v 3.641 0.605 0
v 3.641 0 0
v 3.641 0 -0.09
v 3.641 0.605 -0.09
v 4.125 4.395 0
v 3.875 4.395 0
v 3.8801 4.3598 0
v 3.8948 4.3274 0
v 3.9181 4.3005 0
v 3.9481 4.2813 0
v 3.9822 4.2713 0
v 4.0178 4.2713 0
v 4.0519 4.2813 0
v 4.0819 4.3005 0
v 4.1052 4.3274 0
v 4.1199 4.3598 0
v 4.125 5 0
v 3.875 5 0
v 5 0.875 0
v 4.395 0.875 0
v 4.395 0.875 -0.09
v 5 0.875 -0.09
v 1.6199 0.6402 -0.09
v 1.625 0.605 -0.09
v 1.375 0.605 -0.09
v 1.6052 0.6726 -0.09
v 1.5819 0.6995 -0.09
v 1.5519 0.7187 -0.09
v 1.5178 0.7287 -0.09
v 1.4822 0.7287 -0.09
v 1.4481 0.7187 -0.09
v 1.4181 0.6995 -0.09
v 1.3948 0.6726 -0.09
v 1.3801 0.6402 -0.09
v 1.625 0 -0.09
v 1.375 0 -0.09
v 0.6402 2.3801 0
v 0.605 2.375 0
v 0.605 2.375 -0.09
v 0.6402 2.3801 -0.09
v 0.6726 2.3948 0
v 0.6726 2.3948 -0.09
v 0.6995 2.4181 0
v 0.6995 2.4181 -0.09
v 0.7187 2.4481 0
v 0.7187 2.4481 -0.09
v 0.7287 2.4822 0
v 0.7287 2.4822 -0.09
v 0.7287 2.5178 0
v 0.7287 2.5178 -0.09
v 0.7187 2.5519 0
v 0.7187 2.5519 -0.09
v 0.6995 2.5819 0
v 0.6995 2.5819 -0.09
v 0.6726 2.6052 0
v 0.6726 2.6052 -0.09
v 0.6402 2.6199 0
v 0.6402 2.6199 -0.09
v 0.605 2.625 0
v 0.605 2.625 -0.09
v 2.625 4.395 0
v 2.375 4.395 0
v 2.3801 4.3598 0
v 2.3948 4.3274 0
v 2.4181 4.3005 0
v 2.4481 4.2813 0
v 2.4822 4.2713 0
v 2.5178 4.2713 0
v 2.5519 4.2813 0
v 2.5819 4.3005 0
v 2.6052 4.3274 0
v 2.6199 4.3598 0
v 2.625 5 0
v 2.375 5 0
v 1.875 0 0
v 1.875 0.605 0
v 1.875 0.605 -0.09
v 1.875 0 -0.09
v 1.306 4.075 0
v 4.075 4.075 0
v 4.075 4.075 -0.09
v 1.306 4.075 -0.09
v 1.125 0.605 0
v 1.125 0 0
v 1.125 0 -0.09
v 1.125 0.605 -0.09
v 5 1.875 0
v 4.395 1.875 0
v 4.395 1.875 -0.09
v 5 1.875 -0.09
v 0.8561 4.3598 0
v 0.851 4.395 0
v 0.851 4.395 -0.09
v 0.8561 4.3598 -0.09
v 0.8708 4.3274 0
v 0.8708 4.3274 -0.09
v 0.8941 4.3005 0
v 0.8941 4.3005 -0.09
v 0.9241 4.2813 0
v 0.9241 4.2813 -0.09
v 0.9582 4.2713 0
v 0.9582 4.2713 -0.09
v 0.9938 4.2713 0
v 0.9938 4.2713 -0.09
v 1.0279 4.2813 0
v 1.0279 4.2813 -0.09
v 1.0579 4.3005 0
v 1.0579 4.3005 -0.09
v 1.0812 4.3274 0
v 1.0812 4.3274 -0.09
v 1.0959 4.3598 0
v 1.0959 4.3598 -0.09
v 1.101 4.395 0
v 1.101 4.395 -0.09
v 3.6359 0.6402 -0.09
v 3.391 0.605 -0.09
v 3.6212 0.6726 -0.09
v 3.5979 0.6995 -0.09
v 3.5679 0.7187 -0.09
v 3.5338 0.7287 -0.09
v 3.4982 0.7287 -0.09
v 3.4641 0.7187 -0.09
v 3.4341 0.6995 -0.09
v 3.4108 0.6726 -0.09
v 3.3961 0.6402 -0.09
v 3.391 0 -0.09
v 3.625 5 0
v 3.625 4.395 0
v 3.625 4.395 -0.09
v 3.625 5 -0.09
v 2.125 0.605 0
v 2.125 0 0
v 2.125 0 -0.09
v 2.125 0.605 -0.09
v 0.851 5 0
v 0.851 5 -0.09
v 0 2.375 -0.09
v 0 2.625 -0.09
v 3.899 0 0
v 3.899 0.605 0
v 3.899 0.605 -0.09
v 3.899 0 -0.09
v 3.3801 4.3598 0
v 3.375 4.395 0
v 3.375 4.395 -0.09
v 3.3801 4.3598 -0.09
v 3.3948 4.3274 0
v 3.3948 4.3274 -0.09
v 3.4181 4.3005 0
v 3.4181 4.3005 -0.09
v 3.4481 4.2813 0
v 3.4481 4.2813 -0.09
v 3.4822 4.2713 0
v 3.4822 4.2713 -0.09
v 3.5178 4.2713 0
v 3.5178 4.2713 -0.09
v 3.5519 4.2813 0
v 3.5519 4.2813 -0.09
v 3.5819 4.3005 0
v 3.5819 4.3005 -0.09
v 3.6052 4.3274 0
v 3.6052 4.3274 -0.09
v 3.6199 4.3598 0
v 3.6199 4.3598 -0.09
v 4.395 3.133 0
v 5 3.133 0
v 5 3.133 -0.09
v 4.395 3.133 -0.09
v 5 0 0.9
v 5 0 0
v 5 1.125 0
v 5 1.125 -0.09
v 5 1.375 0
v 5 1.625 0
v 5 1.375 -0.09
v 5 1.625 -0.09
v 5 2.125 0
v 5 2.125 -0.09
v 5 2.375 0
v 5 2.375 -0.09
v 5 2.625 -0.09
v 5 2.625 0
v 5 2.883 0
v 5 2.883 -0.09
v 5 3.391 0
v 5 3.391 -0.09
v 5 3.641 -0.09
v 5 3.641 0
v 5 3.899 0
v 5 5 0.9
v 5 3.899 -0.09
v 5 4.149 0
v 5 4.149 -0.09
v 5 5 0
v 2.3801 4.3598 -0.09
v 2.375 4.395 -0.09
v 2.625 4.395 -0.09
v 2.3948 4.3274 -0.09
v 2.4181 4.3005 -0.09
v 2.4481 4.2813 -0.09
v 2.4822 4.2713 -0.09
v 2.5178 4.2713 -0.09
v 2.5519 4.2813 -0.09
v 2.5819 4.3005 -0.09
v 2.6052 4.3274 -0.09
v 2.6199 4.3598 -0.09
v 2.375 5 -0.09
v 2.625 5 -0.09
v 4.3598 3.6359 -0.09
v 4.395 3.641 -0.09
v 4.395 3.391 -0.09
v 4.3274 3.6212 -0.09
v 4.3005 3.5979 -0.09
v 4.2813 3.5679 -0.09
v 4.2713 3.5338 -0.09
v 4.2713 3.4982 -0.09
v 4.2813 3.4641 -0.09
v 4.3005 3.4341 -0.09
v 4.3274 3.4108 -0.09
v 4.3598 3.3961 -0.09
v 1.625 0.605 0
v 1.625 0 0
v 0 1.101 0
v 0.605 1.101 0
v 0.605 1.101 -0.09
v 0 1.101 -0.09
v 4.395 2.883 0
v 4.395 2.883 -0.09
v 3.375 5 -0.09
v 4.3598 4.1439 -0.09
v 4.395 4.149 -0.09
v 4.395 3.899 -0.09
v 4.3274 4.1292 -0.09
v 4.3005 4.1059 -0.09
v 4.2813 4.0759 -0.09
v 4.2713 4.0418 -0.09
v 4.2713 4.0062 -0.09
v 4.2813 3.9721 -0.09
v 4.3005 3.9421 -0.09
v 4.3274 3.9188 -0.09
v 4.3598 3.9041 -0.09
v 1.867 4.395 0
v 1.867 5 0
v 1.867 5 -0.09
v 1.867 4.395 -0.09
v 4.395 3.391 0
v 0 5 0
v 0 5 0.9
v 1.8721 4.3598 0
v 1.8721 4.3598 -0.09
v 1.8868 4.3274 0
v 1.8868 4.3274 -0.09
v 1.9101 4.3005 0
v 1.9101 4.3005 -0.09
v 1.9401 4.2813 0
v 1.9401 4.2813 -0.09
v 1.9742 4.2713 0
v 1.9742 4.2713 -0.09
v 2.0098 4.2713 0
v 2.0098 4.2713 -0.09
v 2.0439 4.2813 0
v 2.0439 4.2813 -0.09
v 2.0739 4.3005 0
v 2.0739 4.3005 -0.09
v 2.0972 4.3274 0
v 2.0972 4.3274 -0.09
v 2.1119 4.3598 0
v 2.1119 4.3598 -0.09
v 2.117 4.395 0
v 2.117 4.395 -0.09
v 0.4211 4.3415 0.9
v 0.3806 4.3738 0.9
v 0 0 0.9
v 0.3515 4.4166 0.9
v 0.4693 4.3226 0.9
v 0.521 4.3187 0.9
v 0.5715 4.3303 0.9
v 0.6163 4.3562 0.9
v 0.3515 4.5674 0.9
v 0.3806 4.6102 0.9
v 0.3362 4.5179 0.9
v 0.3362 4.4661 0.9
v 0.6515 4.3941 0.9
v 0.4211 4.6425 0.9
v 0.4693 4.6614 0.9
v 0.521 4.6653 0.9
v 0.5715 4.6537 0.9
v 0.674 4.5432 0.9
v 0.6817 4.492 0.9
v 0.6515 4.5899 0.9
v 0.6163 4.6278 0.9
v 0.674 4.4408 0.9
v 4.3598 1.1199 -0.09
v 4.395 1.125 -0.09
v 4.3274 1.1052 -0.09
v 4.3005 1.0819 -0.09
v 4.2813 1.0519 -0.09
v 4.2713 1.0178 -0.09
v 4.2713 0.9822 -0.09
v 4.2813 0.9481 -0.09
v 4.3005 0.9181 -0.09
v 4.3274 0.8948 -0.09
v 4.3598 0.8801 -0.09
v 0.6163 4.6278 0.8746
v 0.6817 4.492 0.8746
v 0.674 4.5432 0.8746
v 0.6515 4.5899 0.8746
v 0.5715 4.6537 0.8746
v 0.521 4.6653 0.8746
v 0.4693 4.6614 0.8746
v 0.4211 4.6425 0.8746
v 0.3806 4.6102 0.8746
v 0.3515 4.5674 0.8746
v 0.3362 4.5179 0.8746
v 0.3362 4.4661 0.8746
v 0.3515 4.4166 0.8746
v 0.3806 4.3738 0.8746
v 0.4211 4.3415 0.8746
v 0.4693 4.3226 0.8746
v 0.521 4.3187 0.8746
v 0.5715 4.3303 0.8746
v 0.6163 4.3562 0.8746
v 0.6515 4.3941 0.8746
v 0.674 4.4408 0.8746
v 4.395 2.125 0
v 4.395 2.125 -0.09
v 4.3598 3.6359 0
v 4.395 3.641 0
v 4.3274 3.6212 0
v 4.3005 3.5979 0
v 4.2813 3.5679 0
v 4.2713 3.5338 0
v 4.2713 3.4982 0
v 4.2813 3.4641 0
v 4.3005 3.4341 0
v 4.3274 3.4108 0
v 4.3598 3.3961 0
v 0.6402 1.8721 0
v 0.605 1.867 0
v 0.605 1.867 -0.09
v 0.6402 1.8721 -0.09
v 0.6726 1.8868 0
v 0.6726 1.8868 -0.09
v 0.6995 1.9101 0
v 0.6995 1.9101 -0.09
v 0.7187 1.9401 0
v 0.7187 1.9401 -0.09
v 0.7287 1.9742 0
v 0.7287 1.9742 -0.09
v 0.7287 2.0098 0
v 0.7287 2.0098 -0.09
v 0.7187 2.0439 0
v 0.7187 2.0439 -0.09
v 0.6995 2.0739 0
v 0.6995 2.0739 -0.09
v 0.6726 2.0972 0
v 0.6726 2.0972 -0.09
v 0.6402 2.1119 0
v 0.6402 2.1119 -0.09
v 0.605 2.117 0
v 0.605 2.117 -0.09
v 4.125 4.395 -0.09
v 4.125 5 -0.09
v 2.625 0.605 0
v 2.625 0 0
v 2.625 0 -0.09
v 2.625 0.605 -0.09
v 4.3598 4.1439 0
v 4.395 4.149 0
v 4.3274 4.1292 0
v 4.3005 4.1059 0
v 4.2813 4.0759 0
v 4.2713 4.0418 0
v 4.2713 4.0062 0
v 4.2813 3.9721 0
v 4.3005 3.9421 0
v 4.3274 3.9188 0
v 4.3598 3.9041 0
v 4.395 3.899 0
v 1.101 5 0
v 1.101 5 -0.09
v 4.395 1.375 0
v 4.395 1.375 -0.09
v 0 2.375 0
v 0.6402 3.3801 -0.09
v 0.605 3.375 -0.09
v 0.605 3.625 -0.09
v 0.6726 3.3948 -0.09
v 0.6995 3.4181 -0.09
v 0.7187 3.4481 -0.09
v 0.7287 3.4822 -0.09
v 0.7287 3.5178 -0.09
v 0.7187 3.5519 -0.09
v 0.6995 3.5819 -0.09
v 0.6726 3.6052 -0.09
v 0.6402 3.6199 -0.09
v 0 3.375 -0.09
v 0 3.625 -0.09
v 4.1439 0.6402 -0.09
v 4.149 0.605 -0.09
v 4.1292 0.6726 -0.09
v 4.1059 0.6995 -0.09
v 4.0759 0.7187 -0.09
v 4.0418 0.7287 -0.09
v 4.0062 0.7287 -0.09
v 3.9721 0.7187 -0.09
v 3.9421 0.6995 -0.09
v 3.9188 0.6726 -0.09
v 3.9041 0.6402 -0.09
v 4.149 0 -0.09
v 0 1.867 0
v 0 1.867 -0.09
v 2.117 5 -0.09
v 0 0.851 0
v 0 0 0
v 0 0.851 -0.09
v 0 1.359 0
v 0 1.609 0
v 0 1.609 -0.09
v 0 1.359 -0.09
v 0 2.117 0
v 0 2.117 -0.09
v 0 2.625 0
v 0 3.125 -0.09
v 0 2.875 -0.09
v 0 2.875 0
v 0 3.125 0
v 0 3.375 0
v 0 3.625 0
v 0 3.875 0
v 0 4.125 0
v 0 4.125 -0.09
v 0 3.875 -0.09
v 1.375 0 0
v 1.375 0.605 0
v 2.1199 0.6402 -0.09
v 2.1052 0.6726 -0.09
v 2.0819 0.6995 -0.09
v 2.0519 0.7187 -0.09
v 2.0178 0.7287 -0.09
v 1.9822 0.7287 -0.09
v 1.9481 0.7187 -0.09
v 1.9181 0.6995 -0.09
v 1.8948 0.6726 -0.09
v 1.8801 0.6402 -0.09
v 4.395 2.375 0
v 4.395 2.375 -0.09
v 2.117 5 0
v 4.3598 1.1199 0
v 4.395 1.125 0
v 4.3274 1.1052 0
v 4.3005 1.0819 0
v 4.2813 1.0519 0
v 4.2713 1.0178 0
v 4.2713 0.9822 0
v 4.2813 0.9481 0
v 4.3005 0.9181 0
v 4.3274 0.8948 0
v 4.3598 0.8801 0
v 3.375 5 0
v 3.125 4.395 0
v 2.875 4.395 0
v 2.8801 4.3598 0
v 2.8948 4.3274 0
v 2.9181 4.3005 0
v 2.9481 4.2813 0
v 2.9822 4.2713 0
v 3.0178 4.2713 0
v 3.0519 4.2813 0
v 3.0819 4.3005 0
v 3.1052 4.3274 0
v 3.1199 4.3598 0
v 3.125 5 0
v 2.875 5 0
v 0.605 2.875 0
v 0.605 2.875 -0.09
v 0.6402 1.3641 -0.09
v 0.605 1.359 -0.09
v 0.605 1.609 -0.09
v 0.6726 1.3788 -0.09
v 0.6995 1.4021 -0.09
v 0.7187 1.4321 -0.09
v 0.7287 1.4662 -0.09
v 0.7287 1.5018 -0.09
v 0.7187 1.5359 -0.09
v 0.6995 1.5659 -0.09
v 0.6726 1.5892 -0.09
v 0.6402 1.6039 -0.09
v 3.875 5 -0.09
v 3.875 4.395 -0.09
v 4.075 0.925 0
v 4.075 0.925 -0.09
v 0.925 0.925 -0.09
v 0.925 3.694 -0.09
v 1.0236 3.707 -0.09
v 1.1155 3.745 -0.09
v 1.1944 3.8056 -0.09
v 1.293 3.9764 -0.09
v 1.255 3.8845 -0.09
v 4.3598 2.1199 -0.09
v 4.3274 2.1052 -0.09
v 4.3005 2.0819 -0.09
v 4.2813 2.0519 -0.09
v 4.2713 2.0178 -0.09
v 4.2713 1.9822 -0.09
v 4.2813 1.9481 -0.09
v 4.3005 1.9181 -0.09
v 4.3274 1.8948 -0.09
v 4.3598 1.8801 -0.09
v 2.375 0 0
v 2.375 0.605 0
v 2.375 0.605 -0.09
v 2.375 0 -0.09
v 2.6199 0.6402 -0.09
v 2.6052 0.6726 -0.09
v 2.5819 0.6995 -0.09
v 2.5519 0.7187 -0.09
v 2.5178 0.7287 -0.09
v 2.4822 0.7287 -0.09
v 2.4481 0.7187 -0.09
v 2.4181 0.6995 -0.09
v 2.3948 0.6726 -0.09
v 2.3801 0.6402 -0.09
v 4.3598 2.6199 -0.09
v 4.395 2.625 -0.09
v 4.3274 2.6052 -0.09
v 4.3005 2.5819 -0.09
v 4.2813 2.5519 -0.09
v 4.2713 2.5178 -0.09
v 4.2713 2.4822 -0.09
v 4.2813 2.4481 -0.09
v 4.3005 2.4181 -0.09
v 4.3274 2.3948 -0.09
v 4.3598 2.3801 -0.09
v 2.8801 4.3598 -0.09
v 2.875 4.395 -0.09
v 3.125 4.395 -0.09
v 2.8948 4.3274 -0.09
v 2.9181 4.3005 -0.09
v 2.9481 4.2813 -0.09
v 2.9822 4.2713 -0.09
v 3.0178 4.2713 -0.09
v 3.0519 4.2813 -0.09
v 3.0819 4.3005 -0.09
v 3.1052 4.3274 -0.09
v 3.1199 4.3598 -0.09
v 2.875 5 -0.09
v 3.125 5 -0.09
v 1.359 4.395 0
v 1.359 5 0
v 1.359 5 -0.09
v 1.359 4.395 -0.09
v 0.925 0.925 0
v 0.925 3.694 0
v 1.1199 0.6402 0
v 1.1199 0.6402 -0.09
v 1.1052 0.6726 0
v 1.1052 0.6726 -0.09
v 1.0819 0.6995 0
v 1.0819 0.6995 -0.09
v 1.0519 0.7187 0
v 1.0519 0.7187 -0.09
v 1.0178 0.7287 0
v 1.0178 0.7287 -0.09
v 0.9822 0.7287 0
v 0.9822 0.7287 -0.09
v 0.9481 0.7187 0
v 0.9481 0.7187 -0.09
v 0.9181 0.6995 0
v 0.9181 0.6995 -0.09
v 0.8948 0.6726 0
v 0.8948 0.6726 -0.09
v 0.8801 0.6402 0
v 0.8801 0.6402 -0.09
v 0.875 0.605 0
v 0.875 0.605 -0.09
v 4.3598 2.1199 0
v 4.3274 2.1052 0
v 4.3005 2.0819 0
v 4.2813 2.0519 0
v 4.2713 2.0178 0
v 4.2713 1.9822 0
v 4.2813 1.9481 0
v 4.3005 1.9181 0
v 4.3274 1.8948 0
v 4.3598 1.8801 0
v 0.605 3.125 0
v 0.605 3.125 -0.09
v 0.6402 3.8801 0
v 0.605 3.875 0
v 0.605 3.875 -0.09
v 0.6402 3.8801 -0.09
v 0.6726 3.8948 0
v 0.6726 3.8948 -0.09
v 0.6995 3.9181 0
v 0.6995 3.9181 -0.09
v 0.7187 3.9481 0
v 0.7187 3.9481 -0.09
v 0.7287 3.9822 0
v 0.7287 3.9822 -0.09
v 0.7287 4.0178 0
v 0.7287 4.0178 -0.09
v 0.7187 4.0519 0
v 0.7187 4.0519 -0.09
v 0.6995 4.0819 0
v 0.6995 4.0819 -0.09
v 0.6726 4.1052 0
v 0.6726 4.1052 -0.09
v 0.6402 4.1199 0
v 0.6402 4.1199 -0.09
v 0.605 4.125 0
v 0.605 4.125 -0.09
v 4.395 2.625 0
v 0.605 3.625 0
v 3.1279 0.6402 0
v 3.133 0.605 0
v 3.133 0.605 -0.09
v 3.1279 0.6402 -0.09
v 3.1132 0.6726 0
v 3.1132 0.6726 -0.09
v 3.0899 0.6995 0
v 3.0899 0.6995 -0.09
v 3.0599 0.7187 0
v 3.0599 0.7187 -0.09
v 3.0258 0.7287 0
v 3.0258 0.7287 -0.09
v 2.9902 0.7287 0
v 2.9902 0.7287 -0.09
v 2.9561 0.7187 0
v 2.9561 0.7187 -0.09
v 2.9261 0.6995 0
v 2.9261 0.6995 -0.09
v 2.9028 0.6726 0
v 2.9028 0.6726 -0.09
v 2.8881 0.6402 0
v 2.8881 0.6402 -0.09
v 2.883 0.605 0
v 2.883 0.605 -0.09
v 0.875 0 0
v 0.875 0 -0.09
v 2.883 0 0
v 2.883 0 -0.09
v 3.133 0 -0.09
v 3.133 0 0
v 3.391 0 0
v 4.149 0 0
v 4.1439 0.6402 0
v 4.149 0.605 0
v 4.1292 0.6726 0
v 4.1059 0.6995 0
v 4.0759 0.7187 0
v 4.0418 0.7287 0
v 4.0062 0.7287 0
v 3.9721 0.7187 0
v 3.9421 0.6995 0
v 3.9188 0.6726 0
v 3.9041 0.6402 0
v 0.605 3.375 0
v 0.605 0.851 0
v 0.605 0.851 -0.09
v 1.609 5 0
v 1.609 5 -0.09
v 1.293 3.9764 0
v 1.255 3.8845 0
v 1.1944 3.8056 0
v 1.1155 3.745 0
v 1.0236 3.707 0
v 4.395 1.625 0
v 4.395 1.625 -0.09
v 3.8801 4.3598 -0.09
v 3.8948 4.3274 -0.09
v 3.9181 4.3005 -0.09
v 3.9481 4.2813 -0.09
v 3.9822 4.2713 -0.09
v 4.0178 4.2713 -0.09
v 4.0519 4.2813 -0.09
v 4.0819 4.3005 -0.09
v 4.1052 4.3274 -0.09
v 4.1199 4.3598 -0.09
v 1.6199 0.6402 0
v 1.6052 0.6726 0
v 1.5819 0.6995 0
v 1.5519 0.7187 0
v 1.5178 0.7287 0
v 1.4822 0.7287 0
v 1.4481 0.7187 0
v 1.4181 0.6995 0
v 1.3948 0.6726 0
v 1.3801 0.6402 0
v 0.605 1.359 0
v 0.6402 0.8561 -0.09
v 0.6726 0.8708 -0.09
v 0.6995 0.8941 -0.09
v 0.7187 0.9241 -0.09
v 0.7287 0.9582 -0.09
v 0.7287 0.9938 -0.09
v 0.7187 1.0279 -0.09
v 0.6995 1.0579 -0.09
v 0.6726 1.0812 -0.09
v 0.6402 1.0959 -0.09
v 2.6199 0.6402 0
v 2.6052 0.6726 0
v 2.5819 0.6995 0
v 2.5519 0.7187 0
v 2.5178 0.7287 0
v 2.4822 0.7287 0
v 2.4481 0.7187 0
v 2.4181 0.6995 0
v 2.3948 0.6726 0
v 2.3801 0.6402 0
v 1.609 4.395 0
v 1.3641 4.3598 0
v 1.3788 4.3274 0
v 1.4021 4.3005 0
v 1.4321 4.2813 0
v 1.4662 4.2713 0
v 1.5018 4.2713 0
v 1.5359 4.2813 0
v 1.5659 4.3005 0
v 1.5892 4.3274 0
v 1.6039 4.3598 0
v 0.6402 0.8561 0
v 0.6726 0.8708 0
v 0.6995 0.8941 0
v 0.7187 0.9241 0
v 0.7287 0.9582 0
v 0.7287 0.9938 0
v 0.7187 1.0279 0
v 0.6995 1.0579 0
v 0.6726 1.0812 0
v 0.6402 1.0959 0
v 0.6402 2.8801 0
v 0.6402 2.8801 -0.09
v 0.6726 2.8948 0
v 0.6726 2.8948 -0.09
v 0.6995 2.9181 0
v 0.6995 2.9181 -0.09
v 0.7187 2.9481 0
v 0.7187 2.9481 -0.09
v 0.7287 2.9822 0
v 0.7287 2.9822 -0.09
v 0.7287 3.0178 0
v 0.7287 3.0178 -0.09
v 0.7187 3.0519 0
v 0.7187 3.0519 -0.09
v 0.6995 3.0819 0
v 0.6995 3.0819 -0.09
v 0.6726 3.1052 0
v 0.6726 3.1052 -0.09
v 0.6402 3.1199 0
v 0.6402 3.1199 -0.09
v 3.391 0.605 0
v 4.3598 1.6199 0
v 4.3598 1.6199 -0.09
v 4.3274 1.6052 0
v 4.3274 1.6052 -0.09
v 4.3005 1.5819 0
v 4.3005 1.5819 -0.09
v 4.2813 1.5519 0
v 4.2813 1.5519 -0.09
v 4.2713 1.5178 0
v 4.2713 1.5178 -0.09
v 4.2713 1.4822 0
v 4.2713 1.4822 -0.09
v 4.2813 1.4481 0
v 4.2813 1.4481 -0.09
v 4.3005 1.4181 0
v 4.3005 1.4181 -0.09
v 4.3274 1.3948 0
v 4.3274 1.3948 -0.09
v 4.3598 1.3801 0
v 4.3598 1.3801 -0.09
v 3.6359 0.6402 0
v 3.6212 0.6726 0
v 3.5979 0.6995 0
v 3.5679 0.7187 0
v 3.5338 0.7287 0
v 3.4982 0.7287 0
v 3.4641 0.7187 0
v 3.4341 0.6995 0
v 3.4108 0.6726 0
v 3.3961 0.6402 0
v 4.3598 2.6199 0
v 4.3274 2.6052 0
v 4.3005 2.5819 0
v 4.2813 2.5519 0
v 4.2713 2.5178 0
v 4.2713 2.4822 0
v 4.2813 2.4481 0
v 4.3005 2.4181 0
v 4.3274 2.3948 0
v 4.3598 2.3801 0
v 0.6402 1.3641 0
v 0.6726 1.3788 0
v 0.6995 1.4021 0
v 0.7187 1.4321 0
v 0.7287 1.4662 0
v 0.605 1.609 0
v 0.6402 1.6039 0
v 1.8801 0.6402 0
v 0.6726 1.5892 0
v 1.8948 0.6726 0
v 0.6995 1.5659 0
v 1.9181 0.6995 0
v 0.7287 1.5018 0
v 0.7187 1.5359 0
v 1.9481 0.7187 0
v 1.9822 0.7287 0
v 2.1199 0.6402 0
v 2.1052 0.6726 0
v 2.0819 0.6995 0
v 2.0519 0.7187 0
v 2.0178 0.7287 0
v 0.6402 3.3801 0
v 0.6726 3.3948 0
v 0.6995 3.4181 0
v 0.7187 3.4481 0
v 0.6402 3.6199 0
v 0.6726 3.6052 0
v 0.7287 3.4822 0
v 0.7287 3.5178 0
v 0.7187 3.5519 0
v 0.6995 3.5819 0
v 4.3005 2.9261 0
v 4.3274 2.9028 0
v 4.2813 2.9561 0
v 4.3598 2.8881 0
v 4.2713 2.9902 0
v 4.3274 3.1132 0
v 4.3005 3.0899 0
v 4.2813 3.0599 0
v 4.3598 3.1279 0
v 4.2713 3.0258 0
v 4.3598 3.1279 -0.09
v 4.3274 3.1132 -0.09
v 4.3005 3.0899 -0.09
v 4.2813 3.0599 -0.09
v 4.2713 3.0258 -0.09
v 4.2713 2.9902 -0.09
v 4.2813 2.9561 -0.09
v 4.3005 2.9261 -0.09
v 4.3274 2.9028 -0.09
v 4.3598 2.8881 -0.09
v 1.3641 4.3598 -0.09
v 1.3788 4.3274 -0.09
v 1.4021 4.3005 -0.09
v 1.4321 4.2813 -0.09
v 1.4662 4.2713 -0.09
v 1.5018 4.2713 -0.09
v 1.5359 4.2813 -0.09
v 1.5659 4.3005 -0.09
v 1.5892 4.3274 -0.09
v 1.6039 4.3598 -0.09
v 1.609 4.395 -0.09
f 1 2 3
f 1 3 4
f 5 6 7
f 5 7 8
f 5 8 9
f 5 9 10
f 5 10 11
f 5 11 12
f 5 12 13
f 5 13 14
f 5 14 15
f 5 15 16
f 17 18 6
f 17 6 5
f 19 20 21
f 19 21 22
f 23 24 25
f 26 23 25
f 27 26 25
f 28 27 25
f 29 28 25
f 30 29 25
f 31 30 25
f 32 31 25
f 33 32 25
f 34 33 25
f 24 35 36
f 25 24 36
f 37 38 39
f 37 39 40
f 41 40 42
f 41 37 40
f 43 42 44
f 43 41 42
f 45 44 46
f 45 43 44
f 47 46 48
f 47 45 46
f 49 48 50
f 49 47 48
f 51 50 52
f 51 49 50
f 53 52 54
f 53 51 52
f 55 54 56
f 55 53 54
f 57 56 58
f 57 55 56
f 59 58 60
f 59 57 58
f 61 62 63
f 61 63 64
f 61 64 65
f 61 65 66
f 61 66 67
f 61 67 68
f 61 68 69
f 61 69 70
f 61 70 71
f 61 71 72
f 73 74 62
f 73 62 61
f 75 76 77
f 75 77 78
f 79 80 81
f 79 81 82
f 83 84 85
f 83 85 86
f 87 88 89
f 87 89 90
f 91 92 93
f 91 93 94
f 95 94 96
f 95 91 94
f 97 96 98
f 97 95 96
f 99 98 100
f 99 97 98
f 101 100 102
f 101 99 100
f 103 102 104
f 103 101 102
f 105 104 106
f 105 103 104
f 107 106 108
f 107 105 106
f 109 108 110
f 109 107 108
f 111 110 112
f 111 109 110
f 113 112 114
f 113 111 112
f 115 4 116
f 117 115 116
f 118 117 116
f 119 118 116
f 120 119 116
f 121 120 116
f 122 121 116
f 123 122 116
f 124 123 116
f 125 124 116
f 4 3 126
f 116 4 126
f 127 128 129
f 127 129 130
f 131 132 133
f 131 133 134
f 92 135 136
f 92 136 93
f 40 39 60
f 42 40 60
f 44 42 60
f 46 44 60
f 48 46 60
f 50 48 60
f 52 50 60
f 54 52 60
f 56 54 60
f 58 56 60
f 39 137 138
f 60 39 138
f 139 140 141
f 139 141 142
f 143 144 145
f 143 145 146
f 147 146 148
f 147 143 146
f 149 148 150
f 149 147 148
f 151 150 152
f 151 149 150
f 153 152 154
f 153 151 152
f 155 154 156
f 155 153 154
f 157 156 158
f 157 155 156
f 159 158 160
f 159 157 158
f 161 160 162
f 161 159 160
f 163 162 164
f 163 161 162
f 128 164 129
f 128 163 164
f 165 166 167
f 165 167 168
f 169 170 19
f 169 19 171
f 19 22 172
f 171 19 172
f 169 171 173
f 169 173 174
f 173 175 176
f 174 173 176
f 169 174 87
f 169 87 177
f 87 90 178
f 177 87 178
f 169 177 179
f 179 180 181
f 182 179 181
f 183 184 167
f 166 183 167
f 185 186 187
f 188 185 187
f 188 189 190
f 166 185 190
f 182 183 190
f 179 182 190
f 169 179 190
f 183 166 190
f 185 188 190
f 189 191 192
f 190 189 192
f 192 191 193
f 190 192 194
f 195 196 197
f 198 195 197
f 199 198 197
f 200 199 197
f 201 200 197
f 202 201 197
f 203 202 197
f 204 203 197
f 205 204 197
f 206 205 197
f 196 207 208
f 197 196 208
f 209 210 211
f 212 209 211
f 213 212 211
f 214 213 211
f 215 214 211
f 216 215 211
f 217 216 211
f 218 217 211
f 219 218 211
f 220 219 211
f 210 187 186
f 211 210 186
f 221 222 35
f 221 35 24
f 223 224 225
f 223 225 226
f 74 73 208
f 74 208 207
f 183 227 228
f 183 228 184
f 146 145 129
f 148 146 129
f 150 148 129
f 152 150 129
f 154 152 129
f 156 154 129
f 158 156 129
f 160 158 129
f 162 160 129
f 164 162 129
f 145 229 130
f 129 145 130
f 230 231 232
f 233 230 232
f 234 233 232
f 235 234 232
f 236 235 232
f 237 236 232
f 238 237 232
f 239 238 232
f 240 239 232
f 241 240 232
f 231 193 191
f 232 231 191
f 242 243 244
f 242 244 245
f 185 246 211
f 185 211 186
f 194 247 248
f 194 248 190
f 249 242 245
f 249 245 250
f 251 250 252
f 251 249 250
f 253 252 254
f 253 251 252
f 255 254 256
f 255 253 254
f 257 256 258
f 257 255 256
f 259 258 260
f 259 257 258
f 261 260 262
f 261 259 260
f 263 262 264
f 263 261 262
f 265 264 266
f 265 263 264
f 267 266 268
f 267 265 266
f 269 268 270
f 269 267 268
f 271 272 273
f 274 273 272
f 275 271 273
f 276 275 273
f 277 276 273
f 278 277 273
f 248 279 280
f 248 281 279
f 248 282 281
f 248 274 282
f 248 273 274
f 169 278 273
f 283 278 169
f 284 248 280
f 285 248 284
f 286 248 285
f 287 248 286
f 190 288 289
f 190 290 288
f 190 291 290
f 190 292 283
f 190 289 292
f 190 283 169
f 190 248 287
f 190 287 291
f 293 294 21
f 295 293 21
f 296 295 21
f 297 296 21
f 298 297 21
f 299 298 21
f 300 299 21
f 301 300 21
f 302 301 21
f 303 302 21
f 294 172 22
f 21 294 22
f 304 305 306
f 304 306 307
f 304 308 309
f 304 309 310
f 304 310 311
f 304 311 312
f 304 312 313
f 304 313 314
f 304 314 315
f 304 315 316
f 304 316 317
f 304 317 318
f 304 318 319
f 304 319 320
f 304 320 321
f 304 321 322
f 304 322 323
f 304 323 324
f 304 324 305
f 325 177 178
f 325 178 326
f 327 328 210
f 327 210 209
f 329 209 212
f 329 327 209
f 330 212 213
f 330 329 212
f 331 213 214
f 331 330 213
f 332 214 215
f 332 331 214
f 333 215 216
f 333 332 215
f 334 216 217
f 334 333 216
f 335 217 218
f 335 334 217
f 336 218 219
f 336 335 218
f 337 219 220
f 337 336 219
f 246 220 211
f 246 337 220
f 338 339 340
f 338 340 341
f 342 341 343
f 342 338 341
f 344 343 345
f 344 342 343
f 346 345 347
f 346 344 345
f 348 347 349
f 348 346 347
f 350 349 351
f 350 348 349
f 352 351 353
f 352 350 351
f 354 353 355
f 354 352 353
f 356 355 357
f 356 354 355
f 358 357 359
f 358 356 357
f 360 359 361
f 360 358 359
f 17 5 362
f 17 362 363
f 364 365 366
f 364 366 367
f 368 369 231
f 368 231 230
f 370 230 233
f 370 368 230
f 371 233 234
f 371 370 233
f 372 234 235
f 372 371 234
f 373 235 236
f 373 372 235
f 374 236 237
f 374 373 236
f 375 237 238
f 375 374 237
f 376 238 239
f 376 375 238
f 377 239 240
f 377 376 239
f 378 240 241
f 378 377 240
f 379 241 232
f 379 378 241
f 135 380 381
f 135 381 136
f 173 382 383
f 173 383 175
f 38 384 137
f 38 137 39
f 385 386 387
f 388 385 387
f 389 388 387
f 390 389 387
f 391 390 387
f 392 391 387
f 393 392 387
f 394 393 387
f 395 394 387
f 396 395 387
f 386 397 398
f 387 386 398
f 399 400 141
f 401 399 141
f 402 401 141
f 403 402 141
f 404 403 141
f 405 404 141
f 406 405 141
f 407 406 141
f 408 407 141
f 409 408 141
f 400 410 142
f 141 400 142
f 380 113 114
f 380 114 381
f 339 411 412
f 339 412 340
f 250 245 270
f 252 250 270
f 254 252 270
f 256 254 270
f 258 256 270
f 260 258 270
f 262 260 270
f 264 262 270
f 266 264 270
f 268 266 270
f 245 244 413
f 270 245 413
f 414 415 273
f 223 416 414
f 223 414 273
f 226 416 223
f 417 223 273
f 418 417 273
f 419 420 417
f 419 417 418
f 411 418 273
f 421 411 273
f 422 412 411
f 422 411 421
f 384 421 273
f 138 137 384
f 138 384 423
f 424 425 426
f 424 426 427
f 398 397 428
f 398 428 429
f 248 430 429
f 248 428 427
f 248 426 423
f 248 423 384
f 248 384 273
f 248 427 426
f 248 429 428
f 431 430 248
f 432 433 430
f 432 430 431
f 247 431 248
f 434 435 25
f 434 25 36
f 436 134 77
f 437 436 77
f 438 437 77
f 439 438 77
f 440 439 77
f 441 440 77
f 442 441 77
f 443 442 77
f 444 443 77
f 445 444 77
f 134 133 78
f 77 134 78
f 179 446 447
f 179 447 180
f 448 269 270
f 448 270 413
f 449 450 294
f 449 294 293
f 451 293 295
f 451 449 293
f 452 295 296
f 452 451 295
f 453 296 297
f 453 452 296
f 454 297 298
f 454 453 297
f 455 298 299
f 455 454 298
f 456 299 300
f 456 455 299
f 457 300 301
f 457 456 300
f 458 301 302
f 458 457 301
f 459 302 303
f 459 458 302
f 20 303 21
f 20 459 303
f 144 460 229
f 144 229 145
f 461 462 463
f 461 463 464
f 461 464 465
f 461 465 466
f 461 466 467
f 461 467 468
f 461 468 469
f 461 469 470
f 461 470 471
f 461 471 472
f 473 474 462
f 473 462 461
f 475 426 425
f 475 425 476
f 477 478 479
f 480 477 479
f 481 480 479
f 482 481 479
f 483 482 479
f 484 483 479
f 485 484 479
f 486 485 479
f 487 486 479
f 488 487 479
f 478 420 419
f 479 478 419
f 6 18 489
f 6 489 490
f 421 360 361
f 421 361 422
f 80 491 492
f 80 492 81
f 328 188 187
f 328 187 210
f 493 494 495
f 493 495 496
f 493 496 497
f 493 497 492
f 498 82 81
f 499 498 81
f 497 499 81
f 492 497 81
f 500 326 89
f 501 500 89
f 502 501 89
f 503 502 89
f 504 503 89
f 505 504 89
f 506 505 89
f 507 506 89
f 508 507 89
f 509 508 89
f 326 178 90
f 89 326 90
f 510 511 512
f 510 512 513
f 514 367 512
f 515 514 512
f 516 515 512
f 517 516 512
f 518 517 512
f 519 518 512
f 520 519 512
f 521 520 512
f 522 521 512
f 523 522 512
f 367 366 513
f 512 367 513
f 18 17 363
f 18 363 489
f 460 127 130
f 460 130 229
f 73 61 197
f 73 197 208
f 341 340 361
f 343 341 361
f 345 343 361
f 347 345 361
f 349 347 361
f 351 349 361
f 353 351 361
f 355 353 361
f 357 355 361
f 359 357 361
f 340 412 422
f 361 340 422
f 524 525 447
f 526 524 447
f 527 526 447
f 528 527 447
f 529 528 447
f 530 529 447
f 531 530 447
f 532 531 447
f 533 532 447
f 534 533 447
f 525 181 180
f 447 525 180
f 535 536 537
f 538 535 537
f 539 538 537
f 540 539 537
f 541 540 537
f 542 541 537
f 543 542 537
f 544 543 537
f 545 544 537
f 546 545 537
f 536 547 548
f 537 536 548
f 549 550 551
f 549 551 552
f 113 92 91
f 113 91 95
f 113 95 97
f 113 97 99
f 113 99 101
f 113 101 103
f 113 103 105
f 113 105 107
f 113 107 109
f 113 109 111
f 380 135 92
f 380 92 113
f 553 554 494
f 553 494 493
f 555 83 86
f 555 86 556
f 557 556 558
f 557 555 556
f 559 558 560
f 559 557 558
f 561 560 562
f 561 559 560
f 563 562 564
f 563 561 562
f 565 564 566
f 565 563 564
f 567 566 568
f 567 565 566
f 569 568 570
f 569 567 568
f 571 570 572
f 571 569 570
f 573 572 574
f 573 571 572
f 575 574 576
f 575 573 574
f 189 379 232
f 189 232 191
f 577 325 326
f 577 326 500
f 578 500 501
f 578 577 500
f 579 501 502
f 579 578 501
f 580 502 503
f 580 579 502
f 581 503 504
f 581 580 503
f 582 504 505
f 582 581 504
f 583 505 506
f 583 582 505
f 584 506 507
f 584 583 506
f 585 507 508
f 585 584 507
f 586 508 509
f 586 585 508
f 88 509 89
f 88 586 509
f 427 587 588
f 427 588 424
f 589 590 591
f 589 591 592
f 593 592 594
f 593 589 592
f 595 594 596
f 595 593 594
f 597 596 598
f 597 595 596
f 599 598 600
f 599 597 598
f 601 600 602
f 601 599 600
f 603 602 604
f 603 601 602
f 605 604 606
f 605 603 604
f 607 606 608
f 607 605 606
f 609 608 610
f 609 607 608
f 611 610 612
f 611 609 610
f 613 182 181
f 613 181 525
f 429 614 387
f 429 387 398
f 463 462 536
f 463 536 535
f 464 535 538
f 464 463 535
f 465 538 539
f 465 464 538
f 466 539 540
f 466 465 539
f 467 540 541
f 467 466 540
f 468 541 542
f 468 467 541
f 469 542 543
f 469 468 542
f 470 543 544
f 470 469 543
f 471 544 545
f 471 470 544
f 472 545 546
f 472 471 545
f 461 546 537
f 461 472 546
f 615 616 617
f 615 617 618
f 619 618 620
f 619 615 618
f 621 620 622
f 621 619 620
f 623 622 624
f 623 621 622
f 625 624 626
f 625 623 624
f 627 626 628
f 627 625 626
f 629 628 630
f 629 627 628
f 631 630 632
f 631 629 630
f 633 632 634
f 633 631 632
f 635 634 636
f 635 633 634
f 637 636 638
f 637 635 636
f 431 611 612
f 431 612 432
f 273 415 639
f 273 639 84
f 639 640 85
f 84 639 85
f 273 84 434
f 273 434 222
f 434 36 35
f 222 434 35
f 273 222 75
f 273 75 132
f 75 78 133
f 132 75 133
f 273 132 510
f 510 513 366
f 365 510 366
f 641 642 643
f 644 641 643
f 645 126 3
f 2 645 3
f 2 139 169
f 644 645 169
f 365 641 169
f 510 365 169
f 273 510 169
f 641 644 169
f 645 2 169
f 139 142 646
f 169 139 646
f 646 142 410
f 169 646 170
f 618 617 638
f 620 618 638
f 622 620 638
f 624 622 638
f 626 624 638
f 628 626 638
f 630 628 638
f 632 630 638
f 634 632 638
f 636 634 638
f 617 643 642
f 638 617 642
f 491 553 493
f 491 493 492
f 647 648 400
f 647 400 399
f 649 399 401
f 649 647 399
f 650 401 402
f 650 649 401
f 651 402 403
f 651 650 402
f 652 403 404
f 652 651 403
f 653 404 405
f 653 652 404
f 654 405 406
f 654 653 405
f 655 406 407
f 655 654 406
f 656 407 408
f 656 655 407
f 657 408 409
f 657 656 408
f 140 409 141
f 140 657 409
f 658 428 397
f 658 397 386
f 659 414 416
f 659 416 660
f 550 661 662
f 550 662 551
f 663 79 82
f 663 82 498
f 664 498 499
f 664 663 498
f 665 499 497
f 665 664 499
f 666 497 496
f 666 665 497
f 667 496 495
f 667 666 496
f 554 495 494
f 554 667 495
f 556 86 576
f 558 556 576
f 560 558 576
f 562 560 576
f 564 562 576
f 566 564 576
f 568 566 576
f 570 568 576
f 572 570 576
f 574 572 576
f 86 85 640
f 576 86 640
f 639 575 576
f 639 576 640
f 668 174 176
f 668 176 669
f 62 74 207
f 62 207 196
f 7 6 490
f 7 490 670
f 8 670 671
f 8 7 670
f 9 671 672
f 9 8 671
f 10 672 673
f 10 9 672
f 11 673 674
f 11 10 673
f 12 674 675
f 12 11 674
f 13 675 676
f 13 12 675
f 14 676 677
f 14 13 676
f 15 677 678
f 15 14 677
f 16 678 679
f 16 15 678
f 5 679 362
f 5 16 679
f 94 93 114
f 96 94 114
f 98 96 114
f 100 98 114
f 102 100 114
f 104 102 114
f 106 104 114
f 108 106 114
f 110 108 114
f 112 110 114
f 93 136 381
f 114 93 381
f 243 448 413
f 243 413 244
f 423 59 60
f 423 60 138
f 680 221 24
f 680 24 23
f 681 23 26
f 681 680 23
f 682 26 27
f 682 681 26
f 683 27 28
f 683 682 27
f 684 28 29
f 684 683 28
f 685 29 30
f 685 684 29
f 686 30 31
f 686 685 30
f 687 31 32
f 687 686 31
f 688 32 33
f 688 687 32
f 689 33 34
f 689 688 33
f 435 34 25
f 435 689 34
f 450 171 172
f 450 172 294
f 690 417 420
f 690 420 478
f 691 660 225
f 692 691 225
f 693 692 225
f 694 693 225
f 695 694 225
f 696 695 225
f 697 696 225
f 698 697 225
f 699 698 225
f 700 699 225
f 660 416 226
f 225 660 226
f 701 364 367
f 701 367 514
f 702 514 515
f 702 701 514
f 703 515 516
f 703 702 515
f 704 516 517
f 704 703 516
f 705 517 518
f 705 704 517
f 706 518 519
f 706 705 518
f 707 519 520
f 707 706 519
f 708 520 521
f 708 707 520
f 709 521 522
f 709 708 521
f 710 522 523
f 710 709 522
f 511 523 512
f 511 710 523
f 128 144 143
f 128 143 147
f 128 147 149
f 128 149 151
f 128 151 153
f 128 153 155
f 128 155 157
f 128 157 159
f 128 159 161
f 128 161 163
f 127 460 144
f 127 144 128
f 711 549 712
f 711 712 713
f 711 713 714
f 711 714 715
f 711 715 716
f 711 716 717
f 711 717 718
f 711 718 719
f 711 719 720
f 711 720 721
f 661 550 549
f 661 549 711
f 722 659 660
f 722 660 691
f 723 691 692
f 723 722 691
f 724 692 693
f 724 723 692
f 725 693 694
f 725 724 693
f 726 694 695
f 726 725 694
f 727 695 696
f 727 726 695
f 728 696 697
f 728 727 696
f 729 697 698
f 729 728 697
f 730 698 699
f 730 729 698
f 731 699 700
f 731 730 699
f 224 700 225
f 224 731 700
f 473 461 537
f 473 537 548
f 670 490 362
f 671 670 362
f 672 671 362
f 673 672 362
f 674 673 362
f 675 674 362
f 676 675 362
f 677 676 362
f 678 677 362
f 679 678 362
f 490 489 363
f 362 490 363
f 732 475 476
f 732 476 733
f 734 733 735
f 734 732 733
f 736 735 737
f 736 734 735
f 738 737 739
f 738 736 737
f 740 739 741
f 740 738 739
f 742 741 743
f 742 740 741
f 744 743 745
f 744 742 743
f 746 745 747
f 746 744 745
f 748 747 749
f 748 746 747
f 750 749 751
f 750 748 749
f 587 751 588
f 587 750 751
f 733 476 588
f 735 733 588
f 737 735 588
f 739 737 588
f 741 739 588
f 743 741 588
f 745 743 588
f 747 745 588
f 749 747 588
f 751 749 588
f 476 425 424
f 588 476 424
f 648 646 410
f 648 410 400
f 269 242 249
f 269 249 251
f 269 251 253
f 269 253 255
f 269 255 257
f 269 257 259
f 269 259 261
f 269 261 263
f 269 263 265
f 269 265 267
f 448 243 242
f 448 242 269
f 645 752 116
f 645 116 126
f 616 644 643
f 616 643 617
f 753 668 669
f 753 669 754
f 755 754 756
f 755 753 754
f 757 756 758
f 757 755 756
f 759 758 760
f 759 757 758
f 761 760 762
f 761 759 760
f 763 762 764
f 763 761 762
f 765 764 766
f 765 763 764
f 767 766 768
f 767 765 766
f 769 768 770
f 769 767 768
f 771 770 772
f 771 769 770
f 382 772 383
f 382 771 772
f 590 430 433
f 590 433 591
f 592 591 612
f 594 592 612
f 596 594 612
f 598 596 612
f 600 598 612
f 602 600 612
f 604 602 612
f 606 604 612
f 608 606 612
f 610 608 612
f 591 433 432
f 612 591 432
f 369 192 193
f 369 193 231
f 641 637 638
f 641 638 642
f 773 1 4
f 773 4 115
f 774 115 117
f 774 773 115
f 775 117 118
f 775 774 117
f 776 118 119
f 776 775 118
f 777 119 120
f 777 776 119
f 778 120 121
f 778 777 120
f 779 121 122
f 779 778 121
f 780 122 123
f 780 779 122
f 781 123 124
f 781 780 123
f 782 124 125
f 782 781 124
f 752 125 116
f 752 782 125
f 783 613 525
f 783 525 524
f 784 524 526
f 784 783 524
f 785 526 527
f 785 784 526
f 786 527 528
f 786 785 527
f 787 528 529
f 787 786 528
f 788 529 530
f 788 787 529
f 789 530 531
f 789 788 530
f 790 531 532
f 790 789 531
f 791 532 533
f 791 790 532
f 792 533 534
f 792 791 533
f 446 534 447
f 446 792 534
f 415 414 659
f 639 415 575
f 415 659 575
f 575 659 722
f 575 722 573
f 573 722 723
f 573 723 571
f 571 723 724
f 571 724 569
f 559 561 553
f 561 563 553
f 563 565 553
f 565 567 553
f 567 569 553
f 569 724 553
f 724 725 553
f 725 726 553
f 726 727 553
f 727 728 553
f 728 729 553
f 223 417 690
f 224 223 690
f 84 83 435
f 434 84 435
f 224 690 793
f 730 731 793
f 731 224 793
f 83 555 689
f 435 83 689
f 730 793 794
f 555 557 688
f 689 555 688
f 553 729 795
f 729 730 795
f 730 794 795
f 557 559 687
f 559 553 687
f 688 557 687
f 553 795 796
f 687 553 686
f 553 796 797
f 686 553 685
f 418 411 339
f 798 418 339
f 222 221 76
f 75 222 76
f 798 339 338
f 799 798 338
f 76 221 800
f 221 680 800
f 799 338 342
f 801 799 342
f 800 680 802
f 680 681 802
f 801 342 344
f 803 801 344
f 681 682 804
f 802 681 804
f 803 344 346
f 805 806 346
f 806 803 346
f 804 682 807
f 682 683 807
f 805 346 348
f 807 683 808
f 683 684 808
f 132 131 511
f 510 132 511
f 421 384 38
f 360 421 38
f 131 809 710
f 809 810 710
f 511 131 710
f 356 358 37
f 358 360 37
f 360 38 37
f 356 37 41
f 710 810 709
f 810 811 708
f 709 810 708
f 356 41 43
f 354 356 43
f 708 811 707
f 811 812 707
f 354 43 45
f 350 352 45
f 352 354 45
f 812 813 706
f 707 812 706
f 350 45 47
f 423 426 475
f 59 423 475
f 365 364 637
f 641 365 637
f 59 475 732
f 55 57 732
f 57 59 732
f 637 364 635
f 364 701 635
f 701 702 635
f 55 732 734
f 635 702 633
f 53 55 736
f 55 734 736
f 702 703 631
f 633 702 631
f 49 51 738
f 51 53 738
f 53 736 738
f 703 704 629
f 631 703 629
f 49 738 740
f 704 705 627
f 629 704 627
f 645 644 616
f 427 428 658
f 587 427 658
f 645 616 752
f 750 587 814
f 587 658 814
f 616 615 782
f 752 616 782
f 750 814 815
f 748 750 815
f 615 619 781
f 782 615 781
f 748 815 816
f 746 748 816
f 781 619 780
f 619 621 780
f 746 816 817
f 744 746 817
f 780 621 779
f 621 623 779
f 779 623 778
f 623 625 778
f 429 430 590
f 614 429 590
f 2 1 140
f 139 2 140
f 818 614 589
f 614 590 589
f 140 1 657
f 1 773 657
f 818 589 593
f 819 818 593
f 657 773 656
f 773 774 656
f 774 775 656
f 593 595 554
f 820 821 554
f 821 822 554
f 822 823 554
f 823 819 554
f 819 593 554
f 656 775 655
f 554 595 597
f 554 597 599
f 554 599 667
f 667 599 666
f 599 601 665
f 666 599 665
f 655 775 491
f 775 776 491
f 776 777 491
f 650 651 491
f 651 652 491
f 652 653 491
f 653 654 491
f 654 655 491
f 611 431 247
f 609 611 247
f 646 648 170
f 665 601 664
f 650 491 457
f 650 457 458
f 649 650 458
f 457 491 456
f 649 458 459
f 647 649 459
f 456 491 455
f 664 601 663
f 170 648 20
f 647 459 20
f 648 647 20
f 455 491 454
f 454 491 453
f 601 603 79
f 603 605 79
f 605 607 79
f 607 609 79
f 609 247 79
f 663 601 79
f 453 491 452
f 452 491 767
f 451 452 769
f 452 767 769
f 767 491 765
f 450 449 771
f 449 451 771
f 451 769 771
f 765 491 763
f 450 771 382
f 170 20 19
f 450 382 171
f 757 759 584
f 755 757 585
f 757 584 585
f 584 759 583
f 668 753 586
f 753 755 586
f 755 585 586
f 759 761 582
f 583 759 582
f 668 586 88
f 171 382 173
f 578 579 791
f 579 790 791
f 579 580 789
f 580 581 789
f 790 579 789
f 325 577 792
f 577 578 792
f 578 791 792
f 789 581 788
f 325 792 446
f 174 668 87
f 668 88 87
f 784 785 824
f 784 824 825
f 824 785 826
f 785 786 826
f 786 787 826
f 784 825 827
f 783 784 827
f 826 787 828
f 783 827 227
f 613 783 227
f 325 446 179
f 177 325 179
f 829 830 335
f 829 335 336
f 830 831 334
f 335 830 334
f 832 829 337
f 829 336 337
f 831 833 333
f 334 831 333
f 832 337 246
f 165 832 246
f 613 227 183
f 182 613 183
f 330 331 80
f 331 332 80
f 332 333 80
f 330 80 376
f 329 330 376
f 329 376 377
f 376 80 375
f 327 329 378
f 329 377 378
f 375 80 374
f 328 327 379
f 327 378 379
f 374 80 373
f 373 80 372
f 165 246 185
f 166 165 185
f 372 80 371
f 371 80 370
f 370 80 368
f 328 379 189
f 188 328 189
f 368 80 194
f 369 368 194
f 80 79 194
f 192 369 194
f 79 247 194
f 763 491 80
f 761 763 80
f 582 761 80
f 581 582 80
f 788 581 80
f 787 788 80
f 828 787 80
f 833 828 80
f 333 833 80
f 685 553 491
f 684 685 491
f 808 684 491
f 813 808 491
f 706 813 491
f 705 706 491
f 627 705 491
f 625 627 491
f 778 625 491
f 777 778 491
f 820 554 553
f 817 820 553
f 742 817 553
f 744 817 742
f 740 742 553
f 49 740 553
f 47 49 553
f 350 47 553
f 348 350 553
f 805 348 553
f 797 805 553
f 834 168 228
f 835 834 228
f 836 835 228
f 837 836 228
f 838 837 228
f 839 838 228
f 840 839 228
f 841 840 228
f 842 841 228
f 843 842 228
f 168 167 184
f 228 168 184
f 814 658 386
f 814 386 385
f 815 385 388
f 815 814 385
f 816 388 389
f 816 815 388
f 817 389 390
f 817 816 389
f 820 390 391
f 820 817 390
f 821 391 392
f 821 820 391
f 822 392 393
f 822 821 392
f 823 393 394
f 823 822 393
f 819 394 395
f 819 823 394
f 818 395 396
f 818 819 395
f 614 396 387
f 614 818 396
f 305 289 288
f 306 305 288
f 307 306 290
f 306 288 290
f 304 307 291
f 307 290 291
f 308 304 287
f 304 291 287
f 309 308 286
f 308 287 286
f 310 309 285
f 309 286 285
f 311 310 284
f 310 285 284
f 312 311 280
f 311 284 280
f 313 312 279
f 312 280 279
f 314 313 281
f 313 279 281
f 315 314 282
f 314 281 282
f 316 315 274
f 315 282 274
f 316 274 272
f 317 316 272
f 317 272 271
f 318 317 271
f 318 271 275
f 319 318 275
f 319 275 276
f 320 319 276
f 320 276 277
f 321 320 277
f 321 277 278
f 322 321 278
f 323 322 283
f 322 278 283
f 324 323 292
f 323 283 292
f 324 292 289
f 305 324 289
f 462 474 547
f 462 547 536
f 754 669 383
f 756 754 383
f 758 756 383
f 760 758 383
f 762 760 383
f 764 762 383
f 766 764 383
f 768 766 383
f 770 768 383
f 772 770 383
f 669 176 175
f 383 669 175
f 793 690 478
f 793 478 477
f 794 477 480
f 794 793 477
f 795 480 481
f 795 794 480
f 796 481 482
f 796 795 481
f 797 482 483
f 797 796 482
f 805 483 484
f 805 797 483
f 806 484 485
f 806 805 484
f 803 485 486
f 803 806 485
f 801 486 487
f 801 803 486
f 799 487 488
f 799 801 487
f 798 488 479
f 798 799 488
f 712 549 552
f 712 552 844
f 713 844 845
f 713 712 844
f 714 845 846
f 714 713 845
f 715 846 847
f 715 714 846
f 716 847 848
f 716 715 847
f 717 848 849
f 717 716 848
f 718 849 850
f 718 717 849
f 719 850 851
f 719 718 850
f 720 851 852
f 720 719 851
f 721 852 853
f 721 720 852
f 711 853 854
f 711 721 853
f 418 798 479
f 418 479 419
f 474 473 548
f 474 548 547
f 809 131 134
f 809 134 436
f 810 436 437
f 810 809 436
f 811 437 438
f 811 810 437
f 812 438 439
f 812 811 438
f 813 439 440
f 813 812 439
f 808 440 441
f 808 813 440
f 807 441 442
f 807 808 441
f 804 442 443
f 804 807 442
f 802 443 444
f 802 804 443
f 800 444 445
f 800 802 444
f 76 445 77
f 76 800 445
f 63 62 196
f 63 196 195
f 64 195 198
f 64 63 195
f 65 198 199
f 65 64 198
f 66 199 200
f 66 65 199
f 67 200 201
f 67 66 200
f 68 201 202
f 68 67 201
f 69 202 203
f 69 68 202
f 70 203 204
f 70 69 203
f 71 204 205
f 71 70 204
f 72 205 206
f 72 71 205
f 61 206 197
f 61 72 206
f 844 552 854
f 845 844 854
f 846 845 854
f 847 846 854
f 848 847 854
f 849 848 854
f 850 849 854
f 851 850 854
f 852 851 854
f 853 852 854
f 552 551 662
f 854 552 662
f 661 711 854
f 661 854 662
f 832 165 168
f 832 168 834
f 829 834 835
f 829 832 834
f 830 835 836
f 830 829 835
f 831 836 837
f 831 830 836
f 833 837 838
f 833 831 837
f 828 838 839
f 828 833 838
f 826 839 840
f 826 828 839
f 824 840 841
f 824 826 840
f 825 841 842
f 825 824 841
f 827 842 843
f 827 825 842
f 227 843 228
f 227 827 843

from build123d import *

# Parameters (mm, degrees)
SKETCH1_W             = 5
SKETCH1_H             = 5
BOSS_EXTRUDE1_DEPTH   = 0.9
BOSS_EXTRUDE3_DEPTH   = 0.09
BOSS_EXTRUDE3_2_DEPTH = 0.09
BOSS_EXTRUDE3_3_DEPTH = 0.09
BOSS_EXTRUDE3_4_DEPTH = 0.09
BOSS_EXTRUDE3_5_DEPTH = 0.09
BOSS_EXTRUDE3_6_DEPTH = 0.09
BOSS_EXTRUDE3_7_DEPTH = 0.09
CIRPATTERN1_COUNT     = 4
SKETCH4_R             = 0.173736533
CUT_EXTRUDE1_DEPTH    = 0.0254
BOSS_EXTRUDE5_DEPTH   = 0.090000074


with BuildPart() as part:
    # Sketch1 → Boss-Extrude1 (new body)
    with BuildSketch(Plane.XY):
        with Locations((2.5, 2.5)):
            Rectangle(SKETCH1_W, SKETCH1_H)
    extrude(amount=BOSS_EXTRUDE1_DEPTH)


with BuildPart() as body_2:
    # Sketch2 → Boss-Extrude3 (new body)
    with BuildSketch(Plane(origin=(0, 0, 0), x_dir=(-1, 0, 0), z_dir=(0, 0, -1))):
        with BuildLine():
            Line((-2.117, 5), (-1.867, 5))
            Line((-1.867, 5), (-1.867, 4.395))
            ThreePointArc((-1.867, 4.395), (-1.992, 4.27), (-2.117, 4.395))
            Line((-2.117, 4.395), (-2.117, 5))
        make_face()
    boss_extrude3 = extrude(amount=BOSS_EXTRUDE3_DEPTH)


with BuildPart() as body_3:
    # Sketch2 → Boss-Extrude3 2 (new body)
    with BuildSketch(Plane(origin=(0, 0, 0), x_dir=(-1, 0, 0), z_dir=(0, 0, -1))):
        with BuildLine():
            Line((-2.625, 5), (-2.375, 5))
            Line((-2.375, 5), (-2.375, 4.395))
            ThreePointArc((-2.375, 4.395), (-2.5, 4.27), (-2.625, 4.395))
            Line((-2.625, 4.395), (-2.625, 5))
        make_face()
    boss_extrude3_2 = extrude(amount=BOSS_EXTRUDE3_2_DEPTH)


with BuildPart() as body_4:
    # Sketch2 → Boss-Extrude3 3 (new body)
    with BuildSketch(Plane(origin=(0, 0, 0), x_dir=(-1, 0, 0), z_dir=(0, 0, -1))):
        with BuildLine():
            Line((-1.609, 5), (-1.359, 5))
            Line((-1.359, 5), (-1.359, 4.395))
            ThreePointArc((-1.359, 4.395), (-1.484, 4.27), (-1.609, 4.395))
            Line((-1.609, 4.395), (-1.609, 5))
        make_face()
    boss_extrude3_3 = extrude(amount=BOSS_EXTRUDE3_3_DEPTH)


with BuildPart() as body_5:
    # Sketch2 → Boss-Extrude3 4 (new body)
    with BuildSketch(Plane(origin=(0, 0, 0), x_dir=(-1, 0, 0), z_dir=(0, 0, -1))):
        with BuildLine():
            Line((-1.101, 5), (-0.851, 5))
            Line((-0.851, 5), (-0.851, 4.395))
            ThreePointArc((-0.851, 4.395), (-0.976, 4.27), (-1.101, 4.395))
            Line((-1.101, 4.395), (-1.101, 5))
        make_face()
    boss_extrude3_4 = extrude(amount=BOSS_EXTRUDE3_4_DEPTH)


with BuildPart() as body_6:
    # Sketch2 → Boss-Extrude3 5 (new body)
    with BuildSketch(Plane(origin=(0, 0, 0), x_dir=(-1, 0, 0), z_dir=(0, 0, -1))):
        with BuildLine():
            Line((-3.125, 5), (-2.875, 5))
            Line((-2.875, 5), (-2.875, 4.395))
            ThreePointArc((-2.875, 4.395), (-3, 4.27), (-3.125, 4.395))
            Line((-3.125, 4.395), (-3.125, 5))
        make_face()
    boss_extrude3_5 = extrude(amount=BOSS_EXTRUDE3_5_DEPTH)


with BuildPart() as body_7:
    # Sketch2 → Boss-Extrude3 6 (new body)
    with BuildSketch(Plane(origin=(0, 0, 0), x_dir=(-1, 0, 0), z_dir=(0, 0, -1))):
        with BuildLine():
            Line((-3.625, 5), (-3.375, 5))
            Line((-3.375, 5), (-3.375, 4.395))
            ThreePointArc((-3.375, 4.395), (-3.5, 4.27), (-3.625, 4.395))
            Line((-3.625, 4.395), (-3.625, 5))
        make_face()
    boss_extrude3_6 = extrude(amount=BOSS_EXTRUDE3_6_DEPTH)


with BuildPart() as body_8:
    # Sketch2 → Boss-Extrude3 7 (new body)
    with BuildSketch(Plane(origin=(0, 0, 0), x_dir=(-1, 0, 0), z_dir=(0, 0, -1))):
        with BuildLine():
            Line((-4.125, 5), (-3.875, 5))
            Line((-3.875, 5), (-3.875, 4.395))
            ThreePointArc((-3.875, 4.395), (-4, 4.27), (-4.125, 4.395))
            Line((-4.125, 4.395), (-4.125, 5))
        make_face()
    boss_extrude3_7 = extrude(amount=BOSS_EXTRUDE3_7_DEPTH)


with BuildPart() as part_1:
    add(part.part)

    # CirPattern1: Boss-Extrude3, Boss-Extrude3 2, Boss-Extrude3 3, Boss-Extrude3 4, Boss-Extrude3 5, Boss-Extrude3 6, Boss-Extrude3 7 ×4 about axis
    cirpattern1_axis = Axis((2.5, 2.5, 0.945), (0, 0, -1))
    add([boss_extrude3.rotate(cirpattern1_axis, i * 360 / CIRPATTERN1_COUNT) for i in range(1, CIRPATTERN1_COUNT)])
    add([boss_extrude3_2.rotate(cirpattern1_axis, i * 360 / CIRPATTERN1_COUNT) for i in range(1, CIRPATTERN1_COUNT)])
    add([boss_extrude3_3.rotate(cirpattern1_axis, i * 360 / CIRPATTERN1_COUNT) for i in range(1, CIRPATTERN1_COUNT)])
    add([boss_extrude3_4.rotate(cirpattern1_axis, i * 360 / CIRPATTERN1_COUNT) for i in range(1, CIRPATTERN1_COUNT)])
    add([boss_extrude3_5.rotate(cirpattern1_axis, i * 360 / CIRPATTERN1_COUNT) for i in range(1, CIRPATTERN1_COUNT)])
    add([boss_extrude3_6.rotate(cirpattern1_axis, i * 360 / CIRPATTERN1_COUNT) for i in range(1, CIRPATTERN1_COUNT)])
    add([boss_extrude3_7.rotate(cirpattern1_axis, i * 360 / CIRPATTERN1_COUNT) for i in range(1, CIRPATTERN1_COUNT)])

    # Sketch4 → Cut-Extrude1 (cut)
    with BuildSketch(Plane.XY.offset(0.9)):
        with Locations((0.508, 4.492)):
            Circle(SKETCH4_R)
    extrude(amount=-CUT_EXTRUDE1_DEPTH, mode=Mode.SUBTRACT)

    # Sketch5 → Boss-Extrude5 (add)
    with BuildSketch(Plane(origin=(0, 0, 0), x_dir=(-1, 0, 0), z_dir=(0, 0, -1))):
        with BuildLine():
            Line((-4.075, 4.075), (-1.306, 4.075))
            ThreePointArc((-1.306, 4.075), (-1.194407684, 3.805592316), (-0.925, 3.694))
            Line((-0.925, 3.694), (-0.925, 0.925))
            Line((-0.925, 0.925), (-4.075, 0.925))
            Line((-4.075, 0.925), (-4.075, 4.075))
        make_face()
    extrude(amount=BOSS_EXTRUDE5_DEPTH)


solid = Compound([body_2.part, body_3.part, body_4.part, body_5.part, body_6.part, body_7.part, body_8.part, part_1.part])
